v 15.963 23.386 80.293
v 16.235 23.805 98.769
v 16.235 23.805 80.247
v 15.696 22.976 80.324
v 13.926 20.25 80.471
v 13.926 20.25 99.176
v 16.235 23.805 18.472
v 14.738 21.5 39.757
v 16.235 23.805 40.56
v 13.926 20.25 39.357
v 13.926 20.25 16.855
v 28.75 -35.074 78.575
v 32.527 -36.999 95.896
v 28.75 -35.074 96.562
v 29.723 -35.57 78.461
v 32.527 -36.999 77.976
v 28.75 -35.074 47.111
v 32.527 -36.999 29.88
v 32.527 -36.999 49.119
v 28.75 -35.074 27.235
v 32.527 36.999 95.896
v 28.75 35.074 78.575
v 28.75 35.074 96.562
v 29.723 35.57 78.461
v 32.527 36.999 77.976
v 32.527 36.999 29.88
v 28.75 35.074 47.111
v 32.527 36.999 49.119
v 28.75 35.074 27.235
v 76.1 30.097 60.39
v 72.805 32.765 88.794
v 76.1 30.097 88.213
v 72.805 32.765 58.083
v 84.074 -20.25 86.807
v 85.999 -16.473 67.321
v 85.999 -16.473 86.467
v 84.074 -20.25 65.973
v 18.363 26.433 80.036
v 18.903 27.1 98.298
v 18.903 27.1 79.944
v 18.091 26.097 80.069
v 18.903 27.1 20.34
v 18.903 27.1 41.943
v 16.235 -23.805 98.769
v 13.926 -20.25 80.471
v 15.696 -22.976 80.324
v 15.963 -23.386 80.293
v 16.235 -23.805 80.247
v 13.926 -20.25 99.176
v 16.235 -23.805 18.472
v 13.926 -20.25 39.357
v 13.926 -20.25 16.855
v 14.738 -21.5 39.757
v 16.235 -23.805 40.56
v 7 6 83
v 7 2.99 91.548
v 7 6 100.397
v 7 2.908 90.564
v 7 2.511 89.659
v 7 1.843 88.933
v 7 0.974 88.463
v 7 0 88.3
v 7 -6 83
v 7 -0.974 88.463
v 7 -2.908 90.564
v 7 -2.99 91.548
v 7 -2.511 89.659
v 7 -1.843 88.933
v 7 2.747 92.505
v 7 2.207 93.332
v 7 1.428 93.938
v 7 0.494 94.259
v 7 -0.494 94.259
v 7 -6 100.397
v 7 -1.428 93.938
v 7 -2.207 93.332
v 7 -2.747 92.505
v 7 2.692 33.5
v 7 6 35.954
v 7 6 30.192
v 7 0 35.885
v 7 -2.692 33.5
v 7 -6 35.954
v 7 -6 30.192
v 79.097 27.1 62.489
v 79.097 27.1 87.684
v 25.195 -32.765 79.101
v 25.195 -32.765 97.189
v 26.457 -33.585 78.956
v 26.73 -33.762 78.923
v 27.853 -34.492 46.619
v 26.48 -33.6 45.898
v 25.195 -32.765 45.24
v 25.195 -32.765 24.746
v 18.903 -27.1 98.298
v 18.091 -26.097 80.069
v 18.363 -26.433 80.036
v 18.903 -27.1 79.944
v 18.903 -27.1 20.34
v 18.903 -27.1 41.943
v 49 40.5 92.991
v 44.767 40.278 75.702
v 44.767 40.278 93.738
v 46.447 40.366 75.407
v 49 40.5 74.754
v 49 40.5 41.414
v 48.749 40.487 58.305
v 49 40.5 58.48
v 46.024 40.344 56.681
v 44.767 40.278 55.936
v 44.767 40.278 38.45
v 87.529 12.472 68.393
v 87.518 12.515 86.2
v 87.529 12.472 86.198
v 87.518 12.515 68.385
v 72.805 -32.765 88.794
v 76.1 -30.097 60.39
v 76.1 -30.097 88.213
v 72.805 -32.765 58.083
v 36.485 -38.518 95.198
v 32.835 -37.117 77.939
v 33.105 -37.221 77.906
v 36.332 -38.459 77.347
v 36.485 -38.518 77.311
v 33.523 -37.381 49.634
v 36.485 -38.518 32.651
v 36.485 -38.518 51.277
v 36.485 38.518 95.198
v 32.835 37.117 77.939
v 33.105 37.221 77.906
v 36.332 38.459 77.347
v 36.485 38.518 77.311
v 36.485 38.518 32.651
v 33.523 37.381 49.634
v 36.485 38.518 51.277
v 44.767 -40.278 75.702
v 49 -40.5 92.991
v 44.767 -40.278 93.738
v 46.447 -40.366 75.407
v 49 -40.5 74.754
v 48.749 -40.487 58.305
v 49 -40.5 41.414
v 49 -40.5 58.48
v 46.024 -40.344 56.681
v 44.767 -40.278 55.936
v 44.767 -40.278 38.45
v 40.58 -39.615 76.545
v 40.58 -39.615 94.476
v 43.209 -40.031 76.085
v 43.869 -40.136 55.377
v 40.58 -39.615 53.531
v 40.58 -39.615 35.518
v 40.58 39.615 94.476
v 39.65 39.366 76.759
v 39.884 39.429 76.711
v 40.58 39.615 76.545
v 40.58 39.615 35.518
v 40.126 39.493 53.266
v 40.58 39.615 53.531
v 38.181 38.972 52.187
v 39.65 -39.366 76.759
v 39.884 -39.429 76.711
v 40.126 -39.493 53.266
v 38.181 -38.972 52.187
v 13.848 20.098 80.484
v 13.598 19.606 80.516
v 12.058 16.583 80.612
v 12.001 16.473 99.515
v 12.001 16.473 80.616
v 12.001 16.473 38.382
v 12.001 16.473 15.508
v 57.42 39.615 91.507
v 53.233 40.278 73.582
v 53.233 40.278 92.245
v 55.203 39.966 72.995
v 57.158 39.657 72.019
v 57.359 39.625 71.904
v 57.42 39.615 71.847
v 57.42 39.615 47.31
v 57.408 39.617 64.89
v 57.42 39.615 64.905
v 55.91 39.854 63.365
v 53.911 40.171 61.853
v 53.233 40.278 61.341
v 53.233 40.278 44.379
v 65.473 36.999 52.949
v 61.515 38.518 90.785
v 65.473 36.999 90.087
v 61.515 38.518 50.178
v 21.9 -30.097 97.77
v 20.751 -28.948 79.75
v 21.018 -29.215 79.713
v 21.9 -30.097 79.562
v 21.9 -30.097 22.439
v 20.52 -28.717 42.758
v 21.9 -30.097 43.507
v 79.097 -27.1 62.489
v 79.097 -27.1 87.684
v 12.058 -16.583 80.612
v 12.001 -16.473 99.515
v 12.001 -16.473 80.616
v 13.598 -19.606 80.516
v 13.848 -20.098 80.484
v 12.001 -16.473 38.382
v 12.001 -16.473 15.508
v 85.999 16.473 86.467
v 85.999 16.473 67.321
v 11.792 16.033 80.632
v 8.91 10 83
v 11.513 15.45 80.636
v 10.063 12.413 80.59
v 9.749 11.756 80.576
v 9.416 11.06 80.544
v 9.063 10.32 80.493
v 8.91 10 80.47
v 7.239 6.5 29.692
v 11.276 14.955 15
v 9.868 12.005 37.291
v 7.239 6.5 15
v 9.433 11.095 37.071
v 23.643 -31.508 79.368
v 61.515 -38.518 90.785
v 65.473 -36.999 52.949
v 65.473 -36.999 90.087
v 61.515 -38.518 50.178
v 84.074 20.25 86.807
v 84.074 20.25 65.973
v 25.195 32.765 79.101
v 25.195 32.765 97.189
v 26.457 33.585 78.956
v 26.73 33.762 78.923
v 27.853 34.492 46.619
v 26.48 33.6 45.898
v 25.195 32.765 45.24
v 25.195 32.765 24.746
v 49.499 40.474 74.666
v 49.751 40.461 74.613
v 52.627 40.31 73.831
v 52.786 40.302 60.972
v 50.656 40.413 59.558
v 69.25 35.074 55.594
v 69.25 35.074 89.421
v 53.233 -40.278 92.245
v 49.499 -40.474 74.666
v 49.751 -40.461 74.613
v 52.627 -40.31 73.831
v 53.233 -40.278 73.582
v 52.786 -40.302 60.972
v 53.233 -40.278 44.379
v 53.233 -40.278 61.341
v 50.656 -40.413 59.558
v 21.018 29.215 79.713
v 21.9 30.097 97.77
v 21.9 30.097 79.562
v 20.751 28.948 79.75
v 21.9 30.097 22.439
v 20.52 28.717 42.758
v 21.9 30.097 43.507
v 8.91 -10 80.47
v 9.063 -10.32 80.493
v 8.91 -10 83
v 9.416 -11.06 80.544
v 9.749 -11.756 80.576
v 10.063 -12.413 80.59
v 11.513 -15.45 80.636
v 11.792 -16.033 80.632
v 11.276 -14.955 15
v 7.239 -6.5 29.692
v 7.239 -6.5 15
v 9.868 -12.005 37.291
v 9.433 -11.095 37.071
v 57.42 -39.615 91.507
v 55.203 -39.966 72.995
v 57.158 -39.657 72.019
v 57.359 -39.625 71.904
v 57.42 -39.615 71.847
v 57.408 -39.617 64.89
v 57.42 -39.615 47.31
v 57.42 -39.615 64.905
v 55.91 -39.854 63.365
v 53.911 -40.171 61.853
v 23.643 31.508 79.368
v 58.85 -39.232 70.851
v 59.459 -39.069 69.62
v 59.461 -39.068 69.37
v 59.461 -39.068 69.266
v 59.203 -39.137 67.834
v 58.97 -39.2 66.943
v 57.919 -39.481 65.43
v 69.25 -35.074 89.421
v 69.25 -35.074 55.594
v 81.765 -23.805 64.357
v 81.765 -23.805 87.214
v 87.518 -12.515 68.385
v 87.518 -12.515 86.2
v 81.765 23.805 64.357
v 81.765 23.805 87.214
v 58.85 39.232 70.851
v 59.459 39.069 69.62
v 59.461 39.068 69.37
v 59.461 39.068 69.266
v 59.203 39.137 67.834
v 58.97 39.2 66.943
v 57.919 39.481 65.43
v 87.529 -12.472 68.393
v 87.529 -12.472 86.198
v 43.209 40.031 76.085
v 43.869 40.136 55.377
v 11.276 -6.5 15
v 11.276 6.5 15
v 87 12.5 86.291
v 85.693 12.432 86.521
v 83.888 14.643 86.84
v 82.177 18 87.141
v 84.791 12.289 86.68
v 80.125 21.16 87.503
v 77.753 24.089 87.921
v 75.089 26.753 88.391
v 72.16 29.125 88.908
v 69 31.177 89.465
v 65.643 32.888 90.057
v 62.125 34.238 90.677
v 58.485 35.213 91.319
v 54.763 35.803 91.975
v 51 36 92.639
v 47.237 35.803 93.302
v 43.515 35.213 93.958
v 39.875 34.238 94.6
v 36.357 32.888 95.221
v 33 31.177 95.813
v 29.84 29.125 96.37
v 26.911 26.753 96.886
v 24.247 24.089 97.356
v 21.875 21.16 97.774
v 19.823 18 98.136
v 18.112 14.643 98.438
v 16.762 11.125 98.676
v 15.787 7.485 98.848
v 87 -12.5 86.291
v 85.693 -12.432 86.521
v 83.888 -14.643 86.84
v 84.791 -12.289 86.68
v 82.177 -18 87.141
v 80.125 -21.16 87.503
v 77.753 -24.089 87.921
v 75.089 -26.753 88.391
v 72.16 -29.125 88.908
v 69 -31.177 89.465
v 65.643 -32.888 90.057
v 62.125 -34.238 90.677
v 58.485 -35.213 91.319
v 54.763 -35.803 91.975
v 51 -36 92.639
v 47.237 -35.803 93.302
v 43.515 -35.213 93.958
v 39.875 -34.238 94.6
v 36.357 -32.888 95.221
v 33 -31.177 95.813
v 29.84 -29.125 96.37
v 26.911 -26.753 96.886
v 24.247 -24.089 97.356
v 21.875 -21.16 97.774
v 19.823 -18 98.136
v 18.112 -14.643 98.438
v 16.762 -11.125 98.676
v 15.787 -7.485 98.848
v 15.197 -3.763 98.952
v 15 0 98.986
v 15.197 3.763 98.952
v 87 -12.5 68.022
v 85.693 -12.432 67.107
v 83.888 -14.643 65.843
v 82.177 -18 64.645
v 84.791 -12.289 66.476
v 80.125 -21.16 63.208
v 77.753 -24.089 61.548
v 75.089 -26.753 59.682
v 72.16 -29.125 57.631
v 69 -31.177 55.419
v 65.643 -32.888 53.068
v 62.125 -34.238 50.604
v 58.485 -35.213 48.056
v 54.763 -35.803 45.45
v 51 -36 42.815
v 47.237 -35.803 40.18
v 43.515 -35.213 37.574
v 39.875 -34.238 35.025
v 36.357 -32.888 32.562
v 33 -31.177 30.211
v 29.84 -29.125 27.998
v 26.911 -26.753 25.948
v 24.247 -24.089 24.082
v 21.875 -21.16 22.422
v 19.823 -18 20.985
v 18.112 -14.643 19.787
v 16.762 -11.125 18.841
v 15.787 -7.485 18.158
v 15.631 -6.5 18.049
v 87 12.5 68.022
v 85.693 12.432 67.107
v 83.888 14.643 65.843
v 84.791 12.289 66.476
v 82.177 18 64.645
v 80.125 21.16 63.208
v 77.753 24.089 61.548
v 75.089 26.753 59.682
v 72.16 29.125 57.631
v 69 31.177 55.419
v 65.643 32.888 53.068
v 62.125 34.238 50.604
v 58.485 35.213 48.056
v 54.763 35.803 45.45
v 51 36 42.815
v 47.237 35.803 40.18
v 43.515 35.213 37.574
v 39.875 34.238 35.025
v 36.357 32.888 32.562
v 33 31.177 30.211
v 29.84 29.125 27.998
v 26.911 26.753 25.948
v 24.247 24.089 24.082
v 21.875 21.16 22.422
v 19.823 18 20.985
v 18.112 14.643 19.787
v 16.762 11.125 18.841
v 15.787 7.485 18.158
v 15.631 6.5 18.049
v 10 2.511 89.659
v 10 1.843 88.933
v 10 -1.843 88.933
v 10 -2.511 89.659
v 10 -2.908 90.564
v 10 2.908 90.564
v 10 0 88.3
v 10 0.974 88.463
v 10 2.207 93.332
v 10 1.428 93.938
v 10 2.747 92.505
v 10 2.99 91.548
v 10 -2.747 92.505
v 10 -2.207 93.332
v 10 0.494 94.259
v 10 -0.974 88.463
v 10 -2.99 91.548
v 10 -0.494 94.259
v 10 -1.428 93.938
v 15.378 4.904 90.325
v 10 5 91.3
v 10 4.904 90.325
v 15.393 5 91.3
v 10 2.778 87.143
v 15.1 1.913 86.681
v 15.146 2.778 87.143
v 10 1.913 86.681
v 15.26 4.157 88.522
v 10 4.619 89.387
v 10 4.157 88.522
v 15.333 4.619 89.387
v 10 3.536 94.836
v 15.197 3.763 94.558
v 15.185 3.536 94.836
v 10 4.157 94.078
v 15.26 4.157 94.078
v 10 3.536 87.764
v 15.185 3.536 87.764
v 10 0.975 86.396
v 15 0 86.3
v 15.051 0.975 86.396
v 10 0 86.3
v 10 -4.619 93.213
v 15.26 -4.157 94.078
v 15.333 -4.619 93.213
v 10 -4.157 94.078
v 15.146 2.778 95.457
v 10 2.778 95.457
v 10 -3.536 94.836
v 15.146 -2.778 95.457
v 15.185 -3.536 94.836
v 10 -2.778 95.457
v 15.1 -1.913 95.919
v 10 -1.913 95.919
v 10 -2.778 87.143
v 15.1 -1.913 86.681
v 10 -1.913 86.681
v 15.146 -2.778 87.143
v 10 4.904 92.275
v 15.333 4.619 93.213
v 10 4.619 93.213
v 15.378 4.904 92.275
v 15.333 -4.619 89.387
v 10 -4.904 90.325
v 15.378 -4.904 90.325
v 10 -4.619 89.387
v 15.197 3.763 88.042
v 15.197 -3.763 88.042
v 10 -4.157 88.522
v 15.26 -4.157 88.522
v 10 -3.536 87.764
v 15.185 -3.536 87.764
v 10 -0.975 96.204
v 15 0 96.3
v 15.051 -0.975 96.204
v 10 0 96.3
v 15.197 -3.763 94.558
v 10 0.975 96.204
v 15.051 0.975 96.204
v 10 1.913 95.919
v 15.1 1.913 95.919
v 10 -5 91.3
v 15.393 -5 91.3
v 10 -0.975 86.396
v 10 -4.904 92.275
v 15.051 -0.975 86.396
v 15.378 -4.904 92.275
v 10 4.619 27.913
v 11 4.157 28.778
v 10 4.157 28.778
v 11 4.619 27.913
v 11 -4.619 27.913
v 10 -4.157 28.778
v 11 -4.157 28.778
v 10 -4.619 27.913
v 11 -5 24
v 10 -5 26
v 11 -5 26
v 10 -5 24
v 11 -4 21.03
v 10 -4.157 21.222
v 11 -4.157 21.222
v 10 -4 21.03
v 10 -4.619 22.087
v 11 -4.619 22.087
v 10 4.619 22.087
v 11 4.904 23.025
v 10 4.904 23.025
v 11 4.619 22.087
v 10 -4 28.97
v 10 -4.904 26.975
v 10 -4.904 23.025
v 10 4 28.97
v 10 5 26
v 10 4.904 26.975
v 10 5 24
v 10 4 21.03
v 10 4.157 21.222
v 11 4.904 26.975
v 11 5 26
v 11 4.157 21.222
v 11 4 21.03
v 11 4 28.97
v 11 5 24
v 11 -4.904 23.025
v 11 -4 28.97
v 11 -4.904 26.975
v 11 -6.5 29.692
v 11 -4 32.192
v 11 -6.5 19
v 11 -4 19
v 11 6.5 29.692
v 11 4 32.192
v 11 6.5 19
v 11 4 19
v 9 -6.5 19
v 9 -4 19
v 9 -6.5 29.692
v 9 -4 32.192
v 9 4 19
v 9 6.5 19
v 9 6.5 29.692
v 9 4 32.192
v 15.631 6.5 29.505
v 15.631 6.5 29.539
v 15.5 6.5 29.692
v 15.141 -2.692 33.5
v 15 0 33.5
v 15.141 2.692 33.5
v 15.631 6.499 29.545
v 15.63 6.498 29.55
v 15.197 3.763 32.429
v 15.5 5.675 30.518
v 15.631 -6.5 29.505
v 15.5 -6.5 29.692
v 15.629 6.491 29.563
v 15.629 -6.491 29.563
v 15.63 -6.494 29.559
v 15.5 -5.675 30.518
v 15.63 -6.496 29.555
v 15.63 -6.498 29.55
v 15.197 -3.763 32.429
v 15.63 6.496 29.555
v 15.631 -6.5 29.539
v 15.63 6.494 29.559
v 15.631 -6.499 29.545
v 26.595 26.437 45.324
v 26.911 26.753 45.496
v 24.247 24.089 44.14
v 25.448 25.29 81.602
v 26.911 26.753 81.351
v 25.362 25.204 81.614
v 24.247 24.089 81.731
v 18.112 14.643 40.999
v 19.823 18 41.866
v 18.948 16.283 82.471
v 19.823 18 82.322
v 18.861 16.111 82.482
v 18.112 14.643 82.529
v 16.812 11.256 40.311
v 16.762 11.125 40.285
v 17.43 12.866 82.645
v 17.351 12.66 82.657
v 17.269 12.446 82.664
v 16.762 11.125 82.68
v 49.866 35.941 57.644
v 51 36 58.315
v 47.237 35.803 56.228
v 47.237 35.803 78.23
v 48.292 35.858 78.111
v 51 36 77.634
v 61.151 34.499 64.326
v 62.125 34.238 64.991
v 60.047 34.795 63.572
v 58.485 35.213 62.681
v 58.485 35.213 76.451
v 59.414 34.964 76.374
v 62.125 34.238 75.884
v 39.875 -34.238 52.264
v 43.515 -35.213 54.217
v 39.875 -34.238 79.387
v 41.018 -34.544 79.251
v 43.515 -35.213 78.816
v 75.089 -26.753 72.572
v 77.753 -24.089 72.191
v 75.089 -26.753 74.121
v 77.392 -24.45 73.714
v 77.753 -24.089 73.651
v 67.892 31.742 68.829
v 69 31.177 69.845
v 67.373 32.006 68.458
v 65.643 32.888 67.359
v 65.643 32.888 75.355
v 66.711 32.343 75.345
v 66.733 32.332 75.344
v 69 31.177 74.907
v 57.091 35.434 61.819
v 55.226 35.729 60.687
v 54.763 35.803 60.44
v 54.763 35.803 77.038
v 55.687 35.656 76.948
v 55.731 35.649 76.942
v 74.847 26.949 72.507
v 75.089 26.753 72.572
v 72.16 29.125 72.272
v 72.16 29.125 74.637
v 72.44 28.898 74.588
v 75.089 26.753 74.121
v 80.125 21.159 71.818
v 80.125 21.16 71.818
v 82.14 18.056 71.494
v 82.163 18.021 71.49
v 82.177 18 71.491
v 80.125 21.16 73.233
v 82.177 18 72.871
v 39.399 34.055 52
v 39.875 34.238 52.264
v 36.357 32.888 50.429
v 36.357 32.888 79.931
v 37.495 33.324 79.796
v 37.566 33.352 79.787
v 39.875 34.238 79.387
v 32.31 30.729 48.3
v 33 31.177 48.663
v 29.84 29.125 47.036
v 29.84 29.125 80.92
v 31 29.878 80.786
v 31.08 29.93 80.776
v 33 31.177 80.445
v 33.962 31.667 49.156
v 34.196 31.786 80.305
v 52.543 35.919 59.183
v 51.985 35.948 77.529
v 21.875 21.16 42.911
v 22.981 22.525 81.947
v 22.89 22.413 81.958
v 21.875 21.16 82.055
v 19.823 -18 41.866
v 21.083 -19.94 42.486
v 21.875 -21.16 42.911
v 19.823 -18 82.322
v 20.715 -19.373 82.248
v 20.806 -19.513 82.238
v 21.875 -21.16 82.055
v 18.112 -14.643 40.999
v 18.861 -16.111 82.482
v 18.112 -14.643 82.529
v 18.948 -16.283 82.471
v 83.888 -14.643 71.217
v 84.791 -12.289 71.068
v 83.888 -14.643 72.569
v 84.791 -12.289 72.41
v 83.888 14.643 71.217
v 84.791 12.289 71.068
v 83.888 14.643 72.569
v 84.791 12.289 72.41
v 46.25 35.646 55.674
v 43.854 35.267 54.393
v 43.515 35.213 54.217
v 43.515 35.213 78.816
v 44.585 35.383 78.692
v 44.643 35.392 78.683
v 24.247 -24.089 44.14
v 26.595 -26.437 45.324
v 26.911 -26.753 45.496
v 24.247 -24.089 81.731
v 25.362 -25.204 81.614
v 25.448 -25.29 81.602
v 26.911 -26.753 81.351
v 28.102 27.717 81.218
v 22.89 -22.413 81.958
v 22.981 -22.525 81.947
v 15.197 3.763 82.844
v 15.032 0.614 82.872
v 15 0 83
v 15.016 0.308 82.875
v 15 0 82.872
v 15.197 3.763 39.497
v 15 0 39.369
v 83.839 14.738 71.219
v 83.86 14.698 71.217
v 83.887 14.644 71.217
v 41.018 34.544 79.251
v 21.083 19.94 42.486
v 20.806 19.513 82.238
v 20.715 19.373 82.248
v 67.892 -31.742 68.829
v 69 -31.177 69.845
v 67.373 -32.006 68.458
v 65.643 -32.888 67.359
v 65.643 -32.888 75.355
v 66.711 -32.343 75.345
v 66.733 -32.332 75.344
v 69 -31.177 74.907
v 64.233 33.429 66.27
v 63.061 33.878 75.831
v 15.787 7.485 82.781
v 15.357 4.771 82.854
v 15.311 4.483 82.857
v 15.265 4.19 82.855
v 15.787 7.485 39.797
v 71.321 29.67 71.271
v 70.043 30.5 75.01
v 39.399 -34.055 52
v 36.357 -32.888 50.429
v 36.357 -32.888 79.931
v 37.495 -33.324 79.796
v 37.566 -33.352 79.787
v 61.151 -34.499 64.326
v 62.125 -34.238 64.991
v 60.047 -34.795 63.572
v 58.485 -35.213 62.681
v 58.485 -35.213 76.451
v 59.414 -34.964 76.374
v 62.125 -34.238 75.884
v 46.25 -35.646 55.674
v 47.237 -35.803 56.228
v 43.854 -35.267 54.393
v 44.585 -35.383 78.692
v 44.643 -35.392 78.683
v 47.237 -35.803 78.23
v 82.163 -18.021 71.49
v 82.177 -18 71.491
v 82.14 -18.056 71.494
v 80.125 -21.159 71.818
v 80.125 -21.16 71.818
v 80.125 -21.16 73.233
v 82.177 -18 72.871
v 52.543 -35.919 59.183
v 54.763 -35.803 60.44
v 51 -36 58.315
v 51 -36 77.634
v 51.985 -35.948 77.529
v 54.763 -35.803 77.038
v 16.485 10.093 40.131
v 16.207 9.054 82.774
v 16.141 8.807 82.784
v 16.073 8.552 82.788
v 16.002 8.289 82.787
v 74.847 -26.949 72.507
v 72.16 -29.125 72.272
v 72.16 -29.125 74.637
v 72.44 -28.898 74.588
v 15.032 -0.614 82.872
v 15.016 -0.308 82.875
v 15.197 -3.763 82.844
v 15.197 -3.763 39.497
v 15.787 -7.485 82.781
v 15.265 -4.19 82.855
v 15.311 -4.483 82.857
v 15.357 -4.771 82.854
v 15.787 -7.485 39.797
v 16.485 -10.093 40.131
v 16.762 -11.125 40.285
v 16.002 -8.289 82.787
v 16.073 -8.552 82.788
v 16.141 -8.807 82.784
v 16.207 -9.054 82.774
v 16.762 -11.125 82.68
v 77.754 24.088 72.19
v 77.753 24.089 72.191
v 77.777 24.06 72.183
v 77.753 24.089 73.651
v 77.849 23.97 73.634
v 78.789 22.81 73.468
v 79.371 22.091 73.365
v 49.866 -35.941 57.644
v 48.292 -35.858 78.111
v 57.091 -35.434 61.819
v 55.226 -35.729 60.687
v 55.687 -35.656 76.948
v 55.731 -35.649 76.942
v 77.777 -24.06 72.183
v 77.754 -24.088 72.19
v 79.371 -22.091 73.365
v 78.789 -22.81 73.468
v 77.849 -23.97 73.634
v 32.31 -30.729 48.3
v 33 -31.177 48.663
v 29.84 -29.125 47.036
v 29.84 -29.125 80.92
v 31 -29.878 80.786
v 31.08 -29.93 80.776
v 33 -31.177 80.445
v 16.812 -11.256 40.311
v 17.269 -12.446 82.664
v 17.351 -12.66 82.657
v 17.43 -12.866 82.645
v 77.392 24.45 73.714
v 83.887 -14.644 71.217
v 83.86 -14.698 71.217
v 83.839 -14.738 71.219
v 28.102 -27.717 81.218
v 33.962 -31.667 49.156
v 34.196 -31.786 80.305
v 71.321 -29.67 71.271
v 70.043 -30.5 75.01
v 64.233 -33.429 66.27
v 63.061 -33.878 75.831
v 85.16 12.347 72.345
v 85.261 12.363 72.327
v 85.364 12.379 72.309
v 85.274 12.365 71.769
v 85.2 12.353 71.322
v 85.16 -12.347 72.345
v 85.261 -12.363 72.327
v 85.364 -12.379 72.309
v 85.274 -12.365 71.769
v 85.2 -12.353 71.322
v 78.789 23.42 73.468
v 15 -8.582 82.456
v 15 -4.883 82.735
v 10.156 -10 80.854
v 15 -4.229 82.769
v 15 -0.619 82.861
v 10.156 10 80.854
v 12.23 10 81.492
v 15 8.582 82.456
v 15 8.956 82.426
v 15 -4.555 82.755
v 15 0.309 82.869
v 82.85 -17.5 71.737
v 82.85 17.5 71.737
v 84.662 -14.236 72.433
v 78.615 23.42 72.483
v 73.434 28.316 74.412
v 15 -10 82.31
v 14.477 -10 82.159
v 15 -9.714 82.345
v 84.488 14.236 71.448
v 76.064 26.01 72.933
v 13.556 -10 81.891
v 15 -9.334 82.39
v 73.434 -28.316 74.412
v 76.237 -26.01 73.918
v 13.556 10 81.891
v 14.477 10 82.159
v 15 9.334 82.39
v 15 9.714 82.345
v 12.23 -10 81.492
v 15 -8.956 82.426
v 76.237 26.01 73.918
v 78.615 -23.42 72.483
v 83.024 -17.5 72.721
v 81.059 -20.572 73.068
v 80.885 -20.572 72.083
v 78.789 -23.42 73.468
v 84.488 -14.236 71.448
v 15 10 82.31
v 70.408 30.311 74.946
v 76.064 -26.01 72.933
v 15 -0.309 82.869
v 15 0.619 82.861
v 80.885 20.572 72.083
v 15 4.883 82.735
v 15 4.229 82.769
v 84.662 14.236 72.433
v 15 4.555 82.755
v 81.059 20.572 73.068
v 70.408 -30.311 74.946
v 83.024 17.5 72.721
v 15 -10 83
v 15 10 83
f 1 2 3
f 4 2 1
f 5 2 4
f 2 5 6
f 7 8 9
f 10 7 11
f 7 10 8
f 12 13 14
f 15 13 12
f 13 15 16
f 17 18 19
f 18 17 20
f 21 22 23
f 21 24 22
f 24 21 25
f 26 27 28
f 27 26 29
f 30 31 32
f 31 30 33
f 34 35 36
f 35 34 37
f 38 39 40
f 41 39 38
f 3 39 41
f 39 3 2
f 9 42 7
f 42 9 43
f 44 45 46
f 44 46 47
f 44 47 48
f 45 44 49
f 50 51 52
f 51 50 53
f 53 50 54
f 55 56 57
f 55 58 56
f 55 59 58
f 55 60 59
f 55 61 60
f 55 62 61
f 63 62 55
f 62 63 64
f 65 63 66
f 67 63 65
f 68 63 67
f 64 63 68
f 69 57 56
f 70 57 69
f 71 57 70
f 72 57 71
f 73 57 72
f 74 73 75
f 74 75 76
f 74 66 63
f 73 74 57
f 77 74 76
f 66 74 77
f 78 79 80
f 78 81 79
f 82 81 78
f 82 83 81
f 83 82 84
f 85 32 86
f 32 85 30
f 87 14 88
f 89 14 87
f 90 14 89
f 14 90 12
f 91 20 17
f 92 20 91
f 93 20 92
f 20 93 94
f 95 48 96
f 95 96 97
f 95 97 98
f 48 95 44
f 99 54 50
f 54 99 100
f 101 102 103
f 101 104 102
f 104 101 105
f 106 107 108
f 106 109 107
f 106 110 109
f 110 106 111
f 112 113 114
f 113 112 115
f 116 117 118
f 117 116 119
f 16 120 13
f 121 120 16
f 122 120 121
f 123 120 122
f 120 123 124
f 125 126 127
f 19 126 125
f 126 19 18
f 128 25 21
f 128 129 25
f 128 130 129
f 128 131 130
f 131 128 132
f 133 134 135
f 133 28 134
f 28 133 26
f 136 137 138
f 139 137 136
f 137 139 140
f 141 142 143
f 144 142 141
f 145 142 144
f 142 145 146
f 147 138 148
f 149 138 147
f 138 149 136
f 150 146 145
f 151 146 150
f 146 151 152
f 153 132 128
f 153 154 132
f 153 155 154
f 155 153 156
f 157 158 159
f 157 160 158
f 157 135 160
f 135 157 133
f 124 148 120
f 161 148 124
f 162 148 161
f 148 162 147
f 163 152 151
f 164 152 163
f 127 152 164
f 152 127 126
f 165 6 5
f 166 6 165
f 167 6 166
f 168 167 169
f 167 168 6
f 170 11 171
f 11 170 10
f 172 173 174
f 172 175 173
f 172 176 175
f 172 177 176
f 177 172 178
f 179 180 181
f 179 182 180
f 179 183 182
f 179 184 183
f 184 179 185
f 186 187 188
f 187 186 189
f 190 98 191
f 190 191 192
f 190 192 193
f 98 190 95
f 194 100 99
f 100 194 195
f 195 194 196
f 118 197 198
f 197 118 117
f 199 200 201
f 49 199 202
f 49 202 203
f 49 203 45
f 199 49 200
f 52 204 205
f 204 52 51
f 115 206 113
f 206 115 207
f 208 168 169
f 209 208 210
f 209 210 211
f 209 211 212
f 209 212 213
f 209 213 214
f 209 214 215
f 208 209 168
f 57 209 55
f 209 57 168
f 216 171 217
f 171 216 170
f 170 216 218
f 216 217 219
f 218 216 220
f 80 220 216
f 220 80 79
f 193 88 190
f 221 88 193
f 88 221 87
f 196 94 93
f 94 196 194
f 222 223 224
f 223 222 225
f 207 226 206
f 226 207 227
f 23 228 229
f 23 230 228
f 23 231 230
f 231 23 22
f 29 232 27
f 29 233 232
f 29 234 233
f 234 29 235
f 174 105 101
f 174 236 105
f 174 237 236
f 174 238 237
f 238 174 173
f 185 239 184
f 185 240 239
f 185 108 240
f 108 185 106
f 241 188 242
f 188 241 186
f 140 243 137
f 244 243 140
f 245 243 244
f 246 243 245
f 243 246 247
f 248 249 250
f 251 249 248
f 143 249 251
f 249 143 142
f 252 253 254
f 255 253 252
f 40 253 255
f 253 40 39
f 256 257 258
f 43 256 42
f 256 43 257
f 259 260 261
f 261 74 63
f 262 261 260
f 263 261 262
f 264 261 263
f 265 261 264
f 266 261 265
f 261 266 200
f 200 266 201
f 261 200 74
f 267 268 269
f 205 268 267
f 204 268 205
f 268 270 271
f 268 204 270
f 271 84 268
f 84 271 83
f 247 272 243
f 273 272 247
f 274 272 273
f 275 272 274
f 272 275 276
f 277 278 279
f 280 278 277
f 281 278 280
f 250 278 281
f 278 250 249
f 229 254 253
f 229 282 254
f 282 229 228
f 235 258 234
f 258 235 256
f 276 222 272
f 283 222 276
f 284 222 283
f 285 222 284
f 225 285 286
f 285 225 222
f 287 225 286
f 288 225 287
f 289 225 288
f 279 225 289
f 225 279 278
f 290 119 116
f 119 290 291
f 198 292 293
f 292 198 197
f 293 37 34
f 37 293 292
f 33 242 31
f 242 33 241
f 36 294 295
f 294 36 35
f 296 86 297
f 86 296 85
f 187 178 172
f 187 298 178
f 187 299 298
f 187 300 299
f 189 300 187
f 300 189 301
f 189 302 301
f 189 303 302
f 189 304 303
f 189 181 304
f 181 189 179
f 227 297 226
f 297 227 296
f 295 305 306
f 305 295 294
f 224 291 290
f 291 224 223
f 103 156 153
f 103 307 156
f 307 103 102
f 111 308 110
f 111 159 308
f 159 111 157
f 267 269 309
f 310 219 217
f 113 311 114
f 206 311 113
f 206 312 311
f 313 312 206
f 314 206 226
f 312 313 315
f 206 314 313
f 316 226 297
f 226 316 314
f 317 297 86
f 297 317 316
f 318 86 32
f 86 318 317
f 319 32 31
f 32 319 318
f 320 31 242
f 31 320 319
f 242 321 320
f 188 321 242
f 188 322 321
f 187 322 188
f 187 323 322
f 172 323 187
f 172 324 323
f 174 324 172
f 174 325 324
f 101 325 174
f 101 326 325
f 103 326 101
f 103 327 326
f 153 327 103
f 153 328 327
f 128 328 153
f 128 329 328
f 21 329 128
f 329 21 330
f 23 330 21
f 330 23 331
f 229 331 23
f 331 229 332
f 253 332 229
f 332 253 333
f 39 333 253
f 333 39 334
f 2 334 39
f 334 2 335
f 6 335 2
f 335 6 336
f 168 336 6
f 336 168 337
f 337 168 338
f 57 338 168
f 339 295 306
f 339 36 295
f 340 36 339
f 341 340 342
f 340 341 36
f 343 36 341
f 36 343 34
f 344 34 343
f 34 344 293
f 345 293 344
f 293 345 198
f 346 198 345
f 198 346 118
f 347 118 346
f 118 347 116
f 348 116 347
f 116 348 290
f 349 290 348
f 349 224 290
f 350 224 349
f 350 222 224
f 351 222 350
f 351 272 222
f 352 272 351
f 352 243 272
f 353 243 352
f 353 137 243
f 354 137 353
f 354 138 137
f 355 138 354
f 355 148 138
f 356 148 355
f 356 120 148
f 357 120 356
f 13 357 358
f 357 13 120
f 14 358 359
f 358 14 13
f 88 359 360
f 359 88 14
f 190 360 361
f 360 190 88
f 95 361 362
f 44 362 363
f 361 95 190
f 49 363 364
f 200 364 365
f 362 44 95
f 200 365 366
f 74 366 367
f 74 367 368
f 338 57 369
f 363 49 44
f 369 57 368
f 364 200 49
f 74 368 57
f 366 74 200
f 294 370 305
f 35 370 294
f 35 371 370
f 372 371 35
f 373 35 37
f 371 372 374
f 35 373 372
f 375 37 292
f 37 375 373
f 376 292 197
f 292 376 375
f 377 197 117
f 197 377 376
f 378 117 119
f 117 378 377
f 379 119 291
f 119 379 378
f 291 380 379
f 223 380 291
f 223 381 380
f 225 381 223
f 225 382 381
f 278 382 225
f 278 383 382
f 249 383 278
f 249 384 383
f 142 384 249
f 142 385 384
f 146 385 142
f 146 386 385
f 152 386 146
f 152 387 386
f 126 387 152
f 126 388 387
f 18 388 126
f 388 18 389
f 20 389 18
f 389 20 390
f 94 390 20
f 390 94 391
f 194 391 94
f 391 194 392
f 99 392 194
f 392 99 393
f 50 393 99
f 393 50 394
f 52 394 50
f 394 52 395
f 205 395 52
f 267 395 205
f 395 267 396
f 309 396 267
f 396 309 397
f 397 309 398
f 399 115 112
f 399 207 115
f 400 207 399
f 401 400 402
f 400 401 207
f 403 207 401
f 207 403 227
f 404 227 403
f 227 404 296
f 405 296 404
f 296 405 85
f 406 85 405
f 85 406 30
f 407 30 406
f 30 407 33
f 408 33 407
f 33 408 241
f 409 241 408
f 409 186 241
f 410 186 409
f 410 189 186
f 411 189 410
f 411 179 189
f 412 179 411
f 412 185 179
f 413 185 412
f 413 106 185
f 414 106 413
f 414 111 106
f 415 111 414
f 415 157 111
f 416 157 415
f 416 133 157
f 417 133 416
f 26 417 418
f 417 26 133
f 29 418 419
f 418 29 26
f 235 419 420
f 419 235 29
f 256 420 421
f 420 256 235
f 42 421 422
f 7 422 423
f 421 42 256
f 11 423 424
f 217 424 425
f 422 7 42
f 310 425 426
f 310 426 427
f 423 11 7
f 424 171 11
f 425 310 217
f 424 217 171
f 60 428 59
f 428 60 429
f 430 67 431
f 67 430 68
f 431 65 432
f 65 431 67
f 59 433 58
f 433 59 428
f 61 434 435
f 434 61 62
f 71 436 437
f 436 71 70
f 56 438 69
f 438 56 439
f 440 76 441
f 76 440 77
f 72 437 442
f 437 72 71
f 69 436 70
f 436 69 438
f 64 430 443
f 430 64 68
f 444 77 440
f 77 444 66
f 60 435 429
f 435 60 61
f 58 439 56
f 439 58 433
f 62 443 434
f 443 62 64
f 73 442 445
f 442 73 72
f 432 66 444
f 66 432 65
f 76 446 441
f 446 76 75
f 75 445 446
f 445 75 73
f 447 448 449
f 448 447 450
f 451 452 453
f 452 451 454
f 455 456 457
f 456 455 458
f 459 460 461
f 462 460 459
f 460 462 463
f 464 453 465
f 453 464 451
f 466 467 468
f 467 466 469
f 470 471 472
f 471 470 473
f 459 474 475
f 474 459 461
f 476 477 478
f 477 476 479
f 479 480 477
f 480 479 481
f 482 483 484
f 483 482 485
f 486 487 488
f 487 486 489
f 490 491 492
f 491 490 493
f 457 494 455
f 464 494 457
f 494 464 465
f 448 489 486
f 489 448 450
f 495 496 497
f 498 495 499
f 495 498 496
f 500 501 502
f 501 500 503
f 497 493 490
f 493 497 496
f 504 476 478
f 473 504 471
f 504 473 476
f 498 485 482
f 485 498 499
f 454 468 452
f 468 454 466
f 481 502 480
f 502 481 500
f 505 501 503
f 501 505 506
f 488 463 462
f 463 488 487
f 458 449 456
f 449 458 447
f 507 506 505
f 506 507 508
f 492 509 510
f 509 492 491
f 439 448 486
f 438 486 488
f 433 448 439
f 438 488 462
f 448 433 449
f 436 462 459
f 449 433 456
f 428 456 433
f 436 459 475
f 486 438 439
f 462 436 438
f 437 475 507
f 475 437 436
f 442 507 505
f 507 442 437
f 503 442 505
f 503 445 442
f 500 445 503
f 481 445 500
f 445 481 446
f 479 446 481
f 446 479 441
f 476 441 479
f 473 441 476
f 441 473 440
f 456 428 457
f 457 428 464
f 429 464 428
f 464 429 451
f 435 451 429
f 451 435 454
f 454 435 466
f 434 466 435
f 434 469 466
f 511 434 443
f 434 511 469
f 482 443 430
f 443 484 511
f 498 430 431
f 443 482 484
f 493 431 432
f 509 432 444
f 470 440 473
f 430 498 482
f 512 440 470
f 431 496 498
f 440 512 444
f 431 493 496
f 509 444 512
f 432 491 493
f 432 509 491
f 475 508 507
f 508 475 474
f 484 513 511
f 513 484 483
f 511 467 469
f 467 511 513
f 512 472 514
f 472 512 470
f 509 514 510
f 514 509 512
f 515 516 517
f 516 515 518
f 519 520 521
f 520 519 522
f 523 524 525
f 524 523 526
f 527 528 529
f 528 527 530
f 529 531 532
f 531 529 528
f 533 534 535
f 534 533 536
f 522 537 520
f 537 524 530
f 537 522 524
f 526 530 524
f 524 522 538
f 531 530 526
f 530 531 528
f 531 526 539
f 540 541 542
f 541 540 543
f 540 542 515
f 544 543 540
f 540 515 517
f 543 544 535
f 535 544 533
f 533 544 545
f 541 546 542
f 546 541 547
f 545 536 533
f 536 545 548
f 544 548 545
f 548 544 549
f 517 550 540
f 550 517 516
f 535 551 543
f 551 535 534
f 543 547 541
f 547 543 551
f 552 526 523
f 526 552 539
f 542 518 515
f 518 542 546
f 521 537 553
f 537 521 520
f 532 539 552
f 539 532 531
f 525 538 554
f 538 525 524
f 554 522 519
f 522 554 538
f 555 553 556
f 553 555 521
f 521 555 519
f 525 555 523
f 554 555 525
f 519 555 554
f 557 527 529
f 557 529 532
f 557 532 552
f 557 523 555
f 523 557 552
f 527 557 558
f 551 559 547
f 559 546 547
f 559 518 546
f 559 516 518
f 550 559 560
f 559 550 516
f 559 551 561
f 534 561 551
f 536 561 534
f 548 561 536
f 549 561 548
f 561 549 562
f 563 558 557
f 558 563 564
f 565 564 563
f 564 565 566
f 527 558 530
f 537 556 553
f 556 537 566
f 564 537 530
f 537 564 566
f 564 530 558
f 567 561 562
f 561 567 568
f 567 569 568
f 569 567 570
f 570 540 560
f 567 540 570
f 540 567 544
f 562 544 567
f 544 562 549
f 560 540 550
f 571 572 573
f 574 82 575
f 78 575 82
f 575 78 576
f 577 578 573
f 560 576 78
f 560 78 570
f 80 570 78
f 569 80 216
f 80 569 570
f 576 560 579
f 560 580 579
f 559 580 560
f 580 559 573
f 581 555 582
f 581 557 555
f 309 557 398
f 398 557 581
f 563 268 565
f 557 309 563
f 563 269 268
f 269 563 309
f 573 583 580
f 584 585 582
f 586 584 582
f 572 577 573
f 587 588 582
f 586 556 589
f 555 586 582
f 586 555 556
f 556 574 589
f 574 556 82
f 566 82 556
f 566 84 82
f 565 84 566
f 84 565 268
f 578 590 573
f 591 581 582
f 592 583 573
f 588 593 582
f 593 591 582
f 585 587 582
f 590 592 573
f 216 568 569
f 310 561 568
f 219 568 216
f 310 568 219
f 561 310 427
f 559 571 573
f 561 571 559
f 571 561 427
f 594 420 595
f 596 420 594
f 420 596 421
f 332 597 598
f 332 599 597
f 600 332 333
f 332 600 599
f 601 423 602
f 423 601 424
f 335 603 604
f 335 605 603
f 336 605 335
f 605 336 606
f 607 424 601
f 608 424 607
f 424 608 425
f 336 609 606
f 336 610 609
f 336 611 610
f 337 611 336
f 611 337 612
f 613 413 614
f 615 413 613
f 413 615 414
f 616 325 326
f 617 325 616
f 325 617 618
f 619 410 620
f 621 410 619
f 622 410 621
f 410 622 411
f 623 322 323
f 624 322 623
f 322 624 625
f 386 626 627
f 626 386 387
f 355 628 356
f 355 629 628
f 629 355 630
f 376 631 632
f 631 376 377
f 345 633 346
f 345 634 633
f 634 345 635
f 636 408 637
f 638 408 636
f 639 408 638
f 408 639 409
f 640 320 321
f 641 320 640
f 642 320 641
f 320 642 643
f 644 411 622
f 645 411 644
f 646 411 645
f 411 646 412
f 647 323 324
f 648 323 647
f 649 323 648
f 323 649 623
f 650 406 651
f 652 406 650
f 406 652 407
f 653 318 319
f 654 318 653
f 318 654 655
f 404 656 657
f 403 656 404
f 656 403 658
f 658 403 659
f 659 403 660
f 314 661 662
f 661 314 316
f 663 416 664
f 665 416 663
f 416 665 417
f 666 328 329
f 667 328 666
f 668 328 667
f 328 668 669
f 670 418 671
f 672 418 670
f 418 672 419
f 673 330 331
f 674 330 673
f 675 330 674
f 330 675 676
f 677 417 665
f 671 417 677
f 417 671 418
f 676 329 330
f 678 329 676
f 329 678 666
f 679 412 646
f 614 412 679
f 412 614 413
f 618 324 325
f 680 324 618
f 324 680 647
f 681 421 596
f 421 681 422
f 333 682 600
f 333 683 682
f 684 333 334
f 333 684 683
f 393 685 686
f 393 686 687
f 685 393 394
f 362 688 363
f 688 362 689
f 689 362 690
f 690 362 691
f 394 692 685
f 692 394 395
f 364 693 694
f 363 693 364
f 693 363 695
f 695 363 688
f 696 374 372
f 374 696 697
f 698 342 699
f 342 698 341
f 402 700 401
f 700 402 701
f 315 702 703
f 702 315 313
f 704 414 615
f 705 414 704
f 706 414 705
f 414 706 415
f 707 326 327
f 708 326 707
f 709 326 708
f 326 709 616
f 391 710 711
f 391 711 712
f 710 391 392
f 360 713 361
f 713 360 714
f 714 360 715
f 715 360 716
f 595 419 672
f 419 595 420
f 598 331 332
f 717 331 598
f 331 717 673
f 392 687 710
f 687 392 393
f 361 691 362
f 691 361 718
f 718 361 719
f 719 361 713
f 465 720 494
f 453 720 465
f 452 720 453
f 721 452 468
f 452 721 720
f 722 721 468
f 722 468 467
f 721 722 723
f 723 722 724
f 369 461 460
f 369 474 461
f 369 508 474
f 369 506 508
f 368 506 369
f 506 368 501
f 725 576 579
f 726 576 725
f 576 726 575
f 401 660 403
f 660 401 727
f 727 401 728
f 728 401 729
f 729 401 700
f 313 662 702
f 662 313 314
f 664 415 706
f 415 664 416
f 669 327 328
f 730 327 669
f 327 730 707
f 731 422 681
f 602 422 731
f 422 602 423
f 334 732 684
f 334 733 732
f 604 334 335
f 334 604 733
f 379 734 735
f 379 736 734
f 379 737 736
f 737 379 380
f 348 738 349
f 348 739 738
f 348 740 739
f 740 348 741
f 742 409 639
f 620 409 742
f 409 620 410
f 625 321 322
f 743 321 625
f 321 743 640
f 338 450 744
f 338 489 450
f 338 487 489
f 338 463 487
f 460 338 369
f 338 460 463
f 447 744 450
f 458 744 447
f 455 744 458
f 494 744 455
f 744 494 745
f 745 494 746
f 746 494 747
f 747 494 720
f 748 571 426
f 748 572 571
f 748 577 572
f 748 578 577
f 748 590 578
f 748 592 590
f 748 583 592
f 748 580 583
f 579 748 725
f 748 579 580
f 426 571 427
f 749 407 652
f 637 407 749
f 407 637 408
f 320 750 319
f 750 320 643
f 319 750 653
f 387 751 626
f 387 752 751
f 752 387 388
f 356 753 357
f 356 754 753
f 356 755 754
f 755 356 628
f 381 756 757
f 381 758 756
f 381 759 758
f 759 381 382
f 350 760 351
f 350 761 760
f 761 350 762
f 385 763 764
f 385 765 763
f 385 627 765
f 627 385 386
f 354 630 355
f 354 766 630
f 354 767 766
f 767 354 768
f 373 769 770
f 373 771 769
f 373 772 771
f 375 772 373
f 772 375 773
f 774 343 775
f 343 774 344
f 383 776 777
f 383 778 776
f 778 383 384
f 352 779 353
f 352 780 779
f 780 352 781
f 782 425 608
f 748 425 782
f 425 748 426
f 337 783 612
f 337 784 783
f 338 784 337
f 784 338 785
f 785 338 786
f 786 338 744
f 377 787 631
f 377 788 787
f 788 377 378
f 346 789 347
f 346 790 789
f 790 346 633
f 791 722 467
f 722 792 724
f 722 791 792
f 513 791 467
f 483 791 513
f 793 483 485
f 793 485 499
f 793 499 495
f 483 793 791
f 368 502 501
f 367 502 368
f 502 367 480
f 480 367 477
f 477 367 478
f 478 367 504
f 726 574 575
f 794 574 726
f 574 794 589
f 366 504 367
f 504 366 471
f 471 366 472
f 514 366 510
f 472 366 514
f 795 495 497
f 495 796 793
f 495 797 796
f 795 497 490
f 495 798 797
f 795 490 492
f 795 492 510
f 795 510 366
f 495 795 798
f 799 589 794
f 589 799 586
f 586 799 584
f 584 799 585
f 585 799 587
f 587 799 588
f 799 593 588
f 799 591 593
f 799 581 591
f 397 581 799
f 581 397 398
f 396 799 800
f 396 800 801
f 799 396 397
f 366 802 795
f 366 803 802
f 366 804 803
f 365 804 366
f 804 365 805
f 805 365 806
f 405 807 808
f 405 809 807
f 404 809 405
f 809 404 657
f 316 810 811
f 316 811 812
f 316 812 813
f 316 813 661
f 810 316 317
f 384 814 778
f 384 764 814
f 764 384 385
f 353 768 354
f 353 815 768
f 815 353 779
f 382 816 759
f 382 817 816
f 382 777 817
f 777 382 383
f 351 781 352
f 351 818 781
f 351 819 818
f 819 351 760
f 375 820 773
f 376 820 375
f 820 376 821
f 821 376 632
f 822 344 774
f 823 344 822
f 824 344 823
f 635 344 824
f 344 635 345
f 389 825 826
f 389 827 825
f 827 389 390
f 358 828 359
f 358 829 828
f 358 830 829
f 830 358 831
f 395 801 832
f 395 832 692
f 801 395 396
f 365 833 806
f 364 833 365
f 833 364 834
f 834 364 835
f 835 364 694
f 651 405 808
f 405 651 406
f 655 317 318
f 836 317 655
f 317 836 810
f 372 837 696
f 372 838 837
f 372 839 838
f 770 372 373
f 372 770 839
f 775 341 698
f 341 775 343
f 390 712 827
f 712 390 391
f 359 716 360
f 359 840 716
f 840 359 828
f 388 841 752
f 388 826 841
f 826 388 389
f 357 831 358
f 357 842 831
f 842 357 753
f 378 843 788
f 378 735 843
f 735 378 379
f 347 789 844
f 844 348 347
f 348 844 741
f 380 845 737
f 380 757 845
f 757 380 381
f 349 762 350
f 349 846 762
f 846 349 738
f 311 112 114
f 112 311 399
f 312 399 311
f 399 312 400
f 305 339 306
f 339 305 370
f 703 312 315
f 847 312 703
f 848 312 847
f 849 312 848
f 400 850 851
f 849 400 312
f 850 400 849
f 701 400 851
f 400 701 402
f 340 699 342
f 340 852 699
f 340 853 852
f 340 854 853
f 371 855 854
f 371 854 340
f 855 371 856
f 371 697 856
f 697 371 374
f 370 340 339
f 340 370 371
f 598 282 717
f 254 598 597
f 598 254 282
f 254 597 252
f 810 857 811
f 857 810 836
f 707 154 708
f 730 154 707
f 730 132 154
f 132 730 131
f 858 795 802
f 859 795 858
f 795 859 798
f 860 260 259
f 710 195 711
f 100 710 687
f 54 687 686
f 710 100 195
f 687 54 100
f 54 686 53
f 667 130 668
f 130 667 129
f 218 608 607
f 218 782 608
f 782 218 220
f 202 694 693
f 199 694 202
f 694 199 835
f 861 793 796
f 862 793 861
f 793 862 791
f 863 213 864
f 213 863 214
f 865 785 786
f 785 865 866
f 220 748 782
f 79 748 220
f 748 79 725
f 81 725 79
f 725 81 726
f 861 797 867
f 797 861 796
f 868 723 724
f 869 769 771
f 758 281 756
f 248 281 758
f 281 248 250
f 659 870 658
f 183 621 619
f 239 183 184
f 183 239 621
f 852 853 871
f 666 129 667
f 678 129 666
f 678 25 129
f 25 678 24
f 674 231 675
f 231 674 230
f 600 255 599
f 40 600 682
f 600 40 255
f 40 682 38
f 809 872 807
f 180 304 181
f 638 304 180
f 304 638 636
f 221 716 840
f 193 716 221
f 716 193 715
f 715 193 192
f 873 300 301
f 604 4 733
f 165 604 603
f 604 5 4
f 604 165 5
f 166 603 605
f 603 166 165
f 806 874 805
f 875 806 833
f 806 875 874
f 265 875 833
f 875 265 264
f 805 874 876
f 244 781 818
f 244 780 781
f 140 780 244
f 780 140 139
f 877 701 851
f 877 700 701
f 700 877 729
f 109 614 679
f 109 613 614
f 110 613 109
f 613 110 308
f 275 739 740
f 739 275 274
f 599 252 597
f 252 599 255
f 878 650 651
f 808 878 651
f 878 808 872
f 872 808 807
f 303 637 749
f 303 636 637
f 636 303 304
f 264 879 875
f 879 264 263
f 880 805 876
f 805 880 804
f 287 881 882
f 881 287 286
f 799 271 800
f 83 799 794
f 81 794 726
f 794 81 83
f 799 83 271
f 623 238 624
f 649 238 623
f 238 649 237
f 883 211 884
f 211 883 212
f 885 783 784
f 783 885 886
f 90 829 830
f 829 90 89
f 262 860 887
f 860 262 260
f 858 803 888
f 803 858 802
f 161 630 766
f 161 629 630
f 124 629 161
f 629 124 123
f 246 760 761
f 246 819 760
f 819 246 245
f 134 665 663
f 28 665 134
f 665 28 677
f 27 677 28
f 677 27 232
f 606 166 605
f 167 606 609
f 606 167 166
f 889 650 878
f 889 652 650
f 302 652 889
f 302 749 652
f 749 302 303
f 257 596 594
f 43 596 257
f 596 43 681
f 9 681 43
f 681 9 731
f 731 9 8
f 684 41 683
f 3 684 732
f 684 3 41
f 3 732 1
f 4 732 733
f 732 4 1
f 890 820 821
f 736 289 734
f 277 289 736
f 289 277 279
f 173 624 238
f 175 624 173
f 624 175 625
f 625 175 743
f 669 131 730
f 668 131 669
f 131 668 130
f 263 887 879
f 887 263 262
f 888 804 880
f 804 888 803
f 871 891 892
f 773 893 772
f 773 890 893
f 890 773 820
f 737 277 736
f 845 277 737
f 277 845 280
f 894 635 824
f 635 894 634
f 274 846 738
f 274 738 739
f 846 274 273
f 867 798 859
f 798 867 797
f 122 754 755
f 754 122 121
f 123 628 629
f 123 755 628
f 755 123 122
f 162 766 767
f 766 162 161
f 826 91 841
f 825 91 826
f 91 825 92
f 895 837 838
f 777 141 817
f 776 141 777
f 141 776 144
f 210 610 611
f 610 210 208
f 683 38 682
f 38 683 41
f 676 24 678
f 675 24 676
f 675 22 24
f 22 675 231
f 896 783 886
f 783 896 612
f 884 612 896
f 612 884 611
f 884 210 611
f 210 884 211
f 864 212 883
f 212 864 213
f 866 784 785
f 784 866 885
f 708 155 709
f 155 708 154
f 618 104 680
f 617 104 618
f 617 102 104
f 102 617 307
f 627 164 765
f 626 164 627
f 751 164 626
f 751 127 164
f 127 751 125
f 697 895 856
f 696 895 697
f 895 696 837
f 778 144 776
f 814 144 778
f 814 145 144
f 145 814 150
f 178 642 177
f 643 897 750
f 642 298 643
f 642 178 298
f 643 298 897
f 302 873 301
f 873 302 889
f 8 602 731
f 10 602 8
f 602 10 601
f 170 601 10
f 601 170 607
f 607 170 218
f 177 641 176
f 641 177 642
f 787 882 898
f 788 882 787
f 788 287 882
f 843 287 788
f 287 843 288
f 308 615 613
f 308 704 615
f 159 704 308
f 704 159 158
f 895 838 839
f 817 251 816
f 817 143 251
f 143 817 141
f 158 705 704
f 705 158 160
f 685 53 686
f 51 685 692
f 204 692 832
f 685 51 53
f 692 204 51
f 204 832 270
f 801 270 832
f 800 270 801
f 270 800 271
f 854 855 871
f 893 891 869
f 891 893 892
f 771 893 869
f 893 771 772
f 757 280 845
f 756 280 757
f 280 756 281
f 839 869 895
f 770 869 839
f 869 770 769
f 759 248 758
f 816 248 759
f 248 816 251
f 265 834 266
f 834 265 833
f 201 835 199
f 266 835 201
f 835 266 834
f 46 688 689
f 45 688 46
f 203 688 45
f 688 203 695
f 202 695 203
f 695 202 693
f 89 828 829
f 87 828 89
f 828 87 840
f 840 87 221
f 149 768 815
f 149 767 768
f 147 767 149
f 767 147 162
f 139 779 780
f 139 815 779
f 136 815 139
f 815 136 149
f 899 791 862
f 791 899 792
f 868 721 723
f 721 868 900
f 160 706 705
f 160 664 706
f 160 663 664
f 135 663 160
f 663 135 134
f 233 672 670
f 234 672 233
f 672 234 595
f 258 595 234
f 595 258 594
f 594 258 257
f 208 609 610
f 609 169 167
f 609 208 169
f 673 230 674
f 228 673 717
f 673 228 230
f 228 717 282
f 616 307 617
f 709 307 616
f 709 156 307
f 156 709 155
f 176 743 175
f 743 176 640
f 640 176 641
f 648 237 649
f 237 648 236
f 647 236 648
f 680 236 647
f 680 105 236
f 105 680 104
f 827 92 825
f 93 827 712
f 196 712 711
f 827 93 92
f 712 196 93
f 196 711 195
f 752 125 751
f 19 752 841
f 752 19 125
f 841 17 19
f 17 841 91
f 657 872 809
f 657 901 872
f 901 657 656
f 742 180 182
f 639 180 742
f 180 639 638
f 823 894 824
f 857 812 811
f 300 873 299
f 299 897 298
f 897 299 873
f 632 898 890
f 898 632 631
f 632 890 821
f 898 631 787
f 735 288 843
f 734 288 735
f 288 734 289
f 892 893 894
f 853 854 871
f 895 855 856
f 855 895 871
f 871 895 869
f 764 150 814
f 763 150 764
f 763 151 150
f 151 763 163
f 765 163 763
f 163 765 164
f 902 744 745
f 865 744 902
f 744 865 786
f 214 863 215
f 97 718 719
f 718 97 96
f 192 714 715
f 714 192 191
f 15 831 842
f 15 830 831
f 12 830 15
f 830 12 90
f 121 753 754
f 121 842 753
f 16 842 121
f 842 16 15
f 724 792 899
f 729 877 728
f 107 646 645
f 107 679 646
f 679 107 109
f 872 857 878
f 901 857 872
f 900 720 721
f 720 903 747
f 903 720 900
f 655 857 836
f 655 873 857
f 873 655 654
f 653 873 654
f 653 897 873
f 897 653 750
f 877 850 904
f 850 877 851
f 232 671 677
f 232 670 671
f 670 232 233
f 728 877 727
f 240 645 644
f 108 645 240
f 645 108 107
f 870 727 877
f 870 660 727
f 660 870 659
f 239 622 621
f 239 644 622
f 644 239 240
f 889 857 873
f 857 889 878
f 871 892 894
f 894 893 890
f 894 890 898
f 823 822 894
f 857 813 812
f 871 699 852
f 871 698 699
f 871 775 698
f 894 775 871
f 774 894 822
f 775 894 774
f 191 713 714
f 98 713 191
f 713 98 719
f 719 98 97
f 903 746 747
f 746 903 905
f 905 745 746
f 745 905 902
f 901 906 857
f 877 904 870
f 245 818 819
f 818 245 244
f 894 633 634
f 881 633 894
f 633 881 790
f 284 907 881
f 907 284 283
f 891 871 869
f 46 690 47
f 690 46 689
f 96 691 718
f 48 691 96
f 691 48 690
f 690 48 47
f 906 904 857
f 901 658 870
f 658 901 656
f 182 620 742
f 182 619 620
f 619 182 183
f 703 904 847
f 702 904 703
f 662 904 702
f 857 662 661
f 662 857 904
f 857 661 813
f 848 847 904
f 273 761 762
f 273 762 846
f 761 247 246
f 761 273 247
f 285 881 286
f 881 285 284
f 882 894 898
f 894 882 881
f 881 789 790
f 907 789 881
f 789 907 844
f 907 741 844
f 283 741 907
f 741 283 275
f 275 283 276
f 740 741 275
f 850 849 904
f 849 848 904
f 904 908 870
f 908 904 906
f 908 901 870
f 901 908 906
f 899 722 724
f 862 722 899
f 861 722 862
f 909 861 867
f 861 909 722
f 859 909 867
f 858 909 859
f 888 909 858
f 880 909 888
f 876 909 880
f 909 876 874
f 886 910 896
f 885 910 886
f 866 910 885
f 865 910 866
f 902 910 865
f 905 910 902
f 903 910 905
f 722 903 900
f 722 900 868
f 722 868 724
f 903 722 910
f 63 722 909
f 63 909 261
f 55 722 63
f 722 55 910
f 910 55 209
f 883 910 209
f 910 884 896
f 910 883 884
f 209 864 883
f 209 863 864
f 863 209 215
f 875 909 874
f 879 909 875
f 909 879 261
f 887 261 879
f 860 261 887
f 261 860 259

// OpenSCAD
$fs = 1;
$fa = 6;

bikeTubeD = 32;
waterBottleD = 72;
waterBottleOffset = 15;

module bikeTube(inflate=0) {
    translate([-bikeTubeD/2,0,0]) cylinder(d=bikeTubeD + 2*inflate, h=200, center=false);
}
module insert() {
    rotate([0,90]) cylinder(d=10, h=4.5, center=true);
}
module thruHole() {
    rotate([0,90]) cylinder(d=6, h=50, center=true);
}
module head() {
    rotate([0,90]) translate([0,0,10]) cylinder(d=10, h=50, center=false);
}
module bolt() {
    insert();
    thruHole();
    head();
}
boltZoffset = 66.3;
module moveToLowerBolt() {
    translate([0,0, 20]) children();
}
module bolts() {
    translate([0,0,5]) moveToLowerBolt() {
        hull() {
            translate([0,0,1]) insert();
            translate([0,0,-1]) insert();
        }
        hull() {
            translate([0,0,1]) thruHole();
            translate([0,0,-1]) thruHole();
        }
        hull() {
            translate([0,0,1]) head();
            translate([0,0,-1]) head();
        }
        translate([0,0,boltZoffset]) bolt();
    }
}
module moveToWaterBottle() {
    translate([waterBottleD/2 + waterBottleOffset,0,0])
        children();
}
waterBottleRadius = 20;
module waterBottle() {
    moveToWaterBottle() {
        hull() {
                rotate_extrude() {
                    translate([waterBottleD/2 - waterBottleRadius/2,waterBottleRadius/2,0]) circle(d=waterBottleRadius);
                }
                translate([0,0,122 - waterBottleRadius/2]) {
                        rotate_extrude() {
                            translate([waterBottleD/2 - waterBottleRadius/2,waterBottleRadius/2,0]) circle(d=waterBottleRadius);
                        }
                    }
            }
    }
}
wid = 12;
wingHeight = boltZoffset + 20;
module moveToWingZ() {
    translate([0,0,15]) children();
}
module wingBase(height) {
    translate([-2,0,0]) moveToWaterBottle() cylinder(d=waterBottleD + 9, h=height, center=false);
}
module oct(h, d, center) {
    rotate([0,0,180/8]) {
        cylinder(d=d/cos(180/8), $fn=8, h=h, center=center);
    }
}
module bottomSupport(inflateShell=0, inflateCutout=1) {
    difference() {
        translate([3.5,0,0]) hull() {
            moveToLowerBolt() translate([5,0,7]) rotate([0, 90, 0]) oct(d=wid + inflateShell, h=12, center = true);

            translate([-15,0,-5]) moveToWaterBottle() cylinder(d = wid + inflateShell, h=5, center=false);

            translate([16,0,5]) rotate([90,0]) cylinder(d = 20, h=wid + inflateShell, center=true);
        }
        bolts();
        waterBottle();
        for (ii=[-1:2:1]) {
            translate([10 - (2 + inflateCutout)/2,ii * wid/2,7 - inflateCutout]) moveToLowerBolt() cube(size=[2 + inflateCutout, 4, 16], center=true);
        }
    }
}
module minBase() {
    difference() {
        translate([0,0,5]) {
            moveToLowerBolt() {
                rotate([0, 90, 0]) {
                    hull() {
                        // lower
                        translate([-2,0,0]) oct(d=wid, h=12, center = true);
                        translate([4,0,0]) oct(d=wid, h=12, center = true);
                    }
                    hull() {
                        translate([-boltZoffset, 0]) {
                            oct(d=wid, h=14, center = true);
                            *translate([-25, 0, 0]) oct(d=wid, h=15, center = true);
                        }
                    }
                    hull() {
                        translate([-boltZoffset,0]) rotate([90,0]) cylinder(d=5, h=wid, center=true);
                        translate([-boltZoffset - 42,0, 15]) rotate([90,0]) cylinder(d=5, h=wid, center=true);
                    }
                    difference() {
                        translate([-boltZoffset - 47,0, 10]) rotate([90,0]) cylinder(d=20, h=wid, center=true);
                        translate([-boltZoffset - 50,0, 4.5]) rotate([0,20,0]) cube(size=[30, wid+1, 20], center=true);
                    }
                }
                intersection() {
                    translate([0,0,-10]) difference() {
                        bikeTube(2);
                        bikeTube();
                    }
                    translate([0,0,(boltZoffset)/2]) cube(size=[50, wid, boltZoffset], center=true);
                }
            }
        }
        bolts();
        bikeTube();
        translate([0,0]) {
            hull() wings();
            waterBottle();
        }
        translate([-bikeTubeD/2,0,-25]) moveToLowerBolt() cylinder(d=40, h=20, center=false);
    }

}
wingTopAngle = 10;
module wings(inflate=0) {
    height = wingHeight + inflate;
    !difference() {
        moveToWingZ() intersection() {
            hull() {
                translate([12, 0, (height)/2]) cube(size=[10, wid, (height)], center=true);
                wingBase(height);
            }
            // angle the top
            translate([0,0,-1]) rotate([0,wingTopAngle]) cube(size=[waterBottleD * 3, waterBottleD * 2, height * 2], center=true);
            // angle the bottom
            translate([0,0,80]) rotate([0,45 + wingTopAngle]) cube(size=[waterBottleD * 2, waterBottleD * 2, height * 4], center=true);
        }
        bolts();
        #waterBottle();
        translate([waterBottleD/2, 0, 0]) moveToWaterBottle() cylinder(d=25, h=200, center=false);

        // cutout the wings
        #hull() {
           translate([-90,0,25]) scale([1,2,1]) cylinder(d=waterBottleD * 2, h=1, center=false);
           translate([2,0,77]) moveToWaterBottle()
                rotate([0,wingTopAngle]) cylinder(d=waterBottleD - 2, h=1, center=false);
        }
        translate([0,0,78]) cube(size=[30, 20, 10], center=true);
        waterBottle();
        translate([1,0,0]) bottomSupport(1, 0);
    }
}

if (true) {
    // display in place
    translate([0,0]) wings();
    minBase();
    bottomSupport();
} else {
    // lay out for printing
    moveToWingZ() translate([60,-10,boltZoffset + 12.5]) rotate([180,wingTopAngle,0])
        wings();
    rotate([90,0,40]) {
        minBase();
        bottomSupport();
    }
}
